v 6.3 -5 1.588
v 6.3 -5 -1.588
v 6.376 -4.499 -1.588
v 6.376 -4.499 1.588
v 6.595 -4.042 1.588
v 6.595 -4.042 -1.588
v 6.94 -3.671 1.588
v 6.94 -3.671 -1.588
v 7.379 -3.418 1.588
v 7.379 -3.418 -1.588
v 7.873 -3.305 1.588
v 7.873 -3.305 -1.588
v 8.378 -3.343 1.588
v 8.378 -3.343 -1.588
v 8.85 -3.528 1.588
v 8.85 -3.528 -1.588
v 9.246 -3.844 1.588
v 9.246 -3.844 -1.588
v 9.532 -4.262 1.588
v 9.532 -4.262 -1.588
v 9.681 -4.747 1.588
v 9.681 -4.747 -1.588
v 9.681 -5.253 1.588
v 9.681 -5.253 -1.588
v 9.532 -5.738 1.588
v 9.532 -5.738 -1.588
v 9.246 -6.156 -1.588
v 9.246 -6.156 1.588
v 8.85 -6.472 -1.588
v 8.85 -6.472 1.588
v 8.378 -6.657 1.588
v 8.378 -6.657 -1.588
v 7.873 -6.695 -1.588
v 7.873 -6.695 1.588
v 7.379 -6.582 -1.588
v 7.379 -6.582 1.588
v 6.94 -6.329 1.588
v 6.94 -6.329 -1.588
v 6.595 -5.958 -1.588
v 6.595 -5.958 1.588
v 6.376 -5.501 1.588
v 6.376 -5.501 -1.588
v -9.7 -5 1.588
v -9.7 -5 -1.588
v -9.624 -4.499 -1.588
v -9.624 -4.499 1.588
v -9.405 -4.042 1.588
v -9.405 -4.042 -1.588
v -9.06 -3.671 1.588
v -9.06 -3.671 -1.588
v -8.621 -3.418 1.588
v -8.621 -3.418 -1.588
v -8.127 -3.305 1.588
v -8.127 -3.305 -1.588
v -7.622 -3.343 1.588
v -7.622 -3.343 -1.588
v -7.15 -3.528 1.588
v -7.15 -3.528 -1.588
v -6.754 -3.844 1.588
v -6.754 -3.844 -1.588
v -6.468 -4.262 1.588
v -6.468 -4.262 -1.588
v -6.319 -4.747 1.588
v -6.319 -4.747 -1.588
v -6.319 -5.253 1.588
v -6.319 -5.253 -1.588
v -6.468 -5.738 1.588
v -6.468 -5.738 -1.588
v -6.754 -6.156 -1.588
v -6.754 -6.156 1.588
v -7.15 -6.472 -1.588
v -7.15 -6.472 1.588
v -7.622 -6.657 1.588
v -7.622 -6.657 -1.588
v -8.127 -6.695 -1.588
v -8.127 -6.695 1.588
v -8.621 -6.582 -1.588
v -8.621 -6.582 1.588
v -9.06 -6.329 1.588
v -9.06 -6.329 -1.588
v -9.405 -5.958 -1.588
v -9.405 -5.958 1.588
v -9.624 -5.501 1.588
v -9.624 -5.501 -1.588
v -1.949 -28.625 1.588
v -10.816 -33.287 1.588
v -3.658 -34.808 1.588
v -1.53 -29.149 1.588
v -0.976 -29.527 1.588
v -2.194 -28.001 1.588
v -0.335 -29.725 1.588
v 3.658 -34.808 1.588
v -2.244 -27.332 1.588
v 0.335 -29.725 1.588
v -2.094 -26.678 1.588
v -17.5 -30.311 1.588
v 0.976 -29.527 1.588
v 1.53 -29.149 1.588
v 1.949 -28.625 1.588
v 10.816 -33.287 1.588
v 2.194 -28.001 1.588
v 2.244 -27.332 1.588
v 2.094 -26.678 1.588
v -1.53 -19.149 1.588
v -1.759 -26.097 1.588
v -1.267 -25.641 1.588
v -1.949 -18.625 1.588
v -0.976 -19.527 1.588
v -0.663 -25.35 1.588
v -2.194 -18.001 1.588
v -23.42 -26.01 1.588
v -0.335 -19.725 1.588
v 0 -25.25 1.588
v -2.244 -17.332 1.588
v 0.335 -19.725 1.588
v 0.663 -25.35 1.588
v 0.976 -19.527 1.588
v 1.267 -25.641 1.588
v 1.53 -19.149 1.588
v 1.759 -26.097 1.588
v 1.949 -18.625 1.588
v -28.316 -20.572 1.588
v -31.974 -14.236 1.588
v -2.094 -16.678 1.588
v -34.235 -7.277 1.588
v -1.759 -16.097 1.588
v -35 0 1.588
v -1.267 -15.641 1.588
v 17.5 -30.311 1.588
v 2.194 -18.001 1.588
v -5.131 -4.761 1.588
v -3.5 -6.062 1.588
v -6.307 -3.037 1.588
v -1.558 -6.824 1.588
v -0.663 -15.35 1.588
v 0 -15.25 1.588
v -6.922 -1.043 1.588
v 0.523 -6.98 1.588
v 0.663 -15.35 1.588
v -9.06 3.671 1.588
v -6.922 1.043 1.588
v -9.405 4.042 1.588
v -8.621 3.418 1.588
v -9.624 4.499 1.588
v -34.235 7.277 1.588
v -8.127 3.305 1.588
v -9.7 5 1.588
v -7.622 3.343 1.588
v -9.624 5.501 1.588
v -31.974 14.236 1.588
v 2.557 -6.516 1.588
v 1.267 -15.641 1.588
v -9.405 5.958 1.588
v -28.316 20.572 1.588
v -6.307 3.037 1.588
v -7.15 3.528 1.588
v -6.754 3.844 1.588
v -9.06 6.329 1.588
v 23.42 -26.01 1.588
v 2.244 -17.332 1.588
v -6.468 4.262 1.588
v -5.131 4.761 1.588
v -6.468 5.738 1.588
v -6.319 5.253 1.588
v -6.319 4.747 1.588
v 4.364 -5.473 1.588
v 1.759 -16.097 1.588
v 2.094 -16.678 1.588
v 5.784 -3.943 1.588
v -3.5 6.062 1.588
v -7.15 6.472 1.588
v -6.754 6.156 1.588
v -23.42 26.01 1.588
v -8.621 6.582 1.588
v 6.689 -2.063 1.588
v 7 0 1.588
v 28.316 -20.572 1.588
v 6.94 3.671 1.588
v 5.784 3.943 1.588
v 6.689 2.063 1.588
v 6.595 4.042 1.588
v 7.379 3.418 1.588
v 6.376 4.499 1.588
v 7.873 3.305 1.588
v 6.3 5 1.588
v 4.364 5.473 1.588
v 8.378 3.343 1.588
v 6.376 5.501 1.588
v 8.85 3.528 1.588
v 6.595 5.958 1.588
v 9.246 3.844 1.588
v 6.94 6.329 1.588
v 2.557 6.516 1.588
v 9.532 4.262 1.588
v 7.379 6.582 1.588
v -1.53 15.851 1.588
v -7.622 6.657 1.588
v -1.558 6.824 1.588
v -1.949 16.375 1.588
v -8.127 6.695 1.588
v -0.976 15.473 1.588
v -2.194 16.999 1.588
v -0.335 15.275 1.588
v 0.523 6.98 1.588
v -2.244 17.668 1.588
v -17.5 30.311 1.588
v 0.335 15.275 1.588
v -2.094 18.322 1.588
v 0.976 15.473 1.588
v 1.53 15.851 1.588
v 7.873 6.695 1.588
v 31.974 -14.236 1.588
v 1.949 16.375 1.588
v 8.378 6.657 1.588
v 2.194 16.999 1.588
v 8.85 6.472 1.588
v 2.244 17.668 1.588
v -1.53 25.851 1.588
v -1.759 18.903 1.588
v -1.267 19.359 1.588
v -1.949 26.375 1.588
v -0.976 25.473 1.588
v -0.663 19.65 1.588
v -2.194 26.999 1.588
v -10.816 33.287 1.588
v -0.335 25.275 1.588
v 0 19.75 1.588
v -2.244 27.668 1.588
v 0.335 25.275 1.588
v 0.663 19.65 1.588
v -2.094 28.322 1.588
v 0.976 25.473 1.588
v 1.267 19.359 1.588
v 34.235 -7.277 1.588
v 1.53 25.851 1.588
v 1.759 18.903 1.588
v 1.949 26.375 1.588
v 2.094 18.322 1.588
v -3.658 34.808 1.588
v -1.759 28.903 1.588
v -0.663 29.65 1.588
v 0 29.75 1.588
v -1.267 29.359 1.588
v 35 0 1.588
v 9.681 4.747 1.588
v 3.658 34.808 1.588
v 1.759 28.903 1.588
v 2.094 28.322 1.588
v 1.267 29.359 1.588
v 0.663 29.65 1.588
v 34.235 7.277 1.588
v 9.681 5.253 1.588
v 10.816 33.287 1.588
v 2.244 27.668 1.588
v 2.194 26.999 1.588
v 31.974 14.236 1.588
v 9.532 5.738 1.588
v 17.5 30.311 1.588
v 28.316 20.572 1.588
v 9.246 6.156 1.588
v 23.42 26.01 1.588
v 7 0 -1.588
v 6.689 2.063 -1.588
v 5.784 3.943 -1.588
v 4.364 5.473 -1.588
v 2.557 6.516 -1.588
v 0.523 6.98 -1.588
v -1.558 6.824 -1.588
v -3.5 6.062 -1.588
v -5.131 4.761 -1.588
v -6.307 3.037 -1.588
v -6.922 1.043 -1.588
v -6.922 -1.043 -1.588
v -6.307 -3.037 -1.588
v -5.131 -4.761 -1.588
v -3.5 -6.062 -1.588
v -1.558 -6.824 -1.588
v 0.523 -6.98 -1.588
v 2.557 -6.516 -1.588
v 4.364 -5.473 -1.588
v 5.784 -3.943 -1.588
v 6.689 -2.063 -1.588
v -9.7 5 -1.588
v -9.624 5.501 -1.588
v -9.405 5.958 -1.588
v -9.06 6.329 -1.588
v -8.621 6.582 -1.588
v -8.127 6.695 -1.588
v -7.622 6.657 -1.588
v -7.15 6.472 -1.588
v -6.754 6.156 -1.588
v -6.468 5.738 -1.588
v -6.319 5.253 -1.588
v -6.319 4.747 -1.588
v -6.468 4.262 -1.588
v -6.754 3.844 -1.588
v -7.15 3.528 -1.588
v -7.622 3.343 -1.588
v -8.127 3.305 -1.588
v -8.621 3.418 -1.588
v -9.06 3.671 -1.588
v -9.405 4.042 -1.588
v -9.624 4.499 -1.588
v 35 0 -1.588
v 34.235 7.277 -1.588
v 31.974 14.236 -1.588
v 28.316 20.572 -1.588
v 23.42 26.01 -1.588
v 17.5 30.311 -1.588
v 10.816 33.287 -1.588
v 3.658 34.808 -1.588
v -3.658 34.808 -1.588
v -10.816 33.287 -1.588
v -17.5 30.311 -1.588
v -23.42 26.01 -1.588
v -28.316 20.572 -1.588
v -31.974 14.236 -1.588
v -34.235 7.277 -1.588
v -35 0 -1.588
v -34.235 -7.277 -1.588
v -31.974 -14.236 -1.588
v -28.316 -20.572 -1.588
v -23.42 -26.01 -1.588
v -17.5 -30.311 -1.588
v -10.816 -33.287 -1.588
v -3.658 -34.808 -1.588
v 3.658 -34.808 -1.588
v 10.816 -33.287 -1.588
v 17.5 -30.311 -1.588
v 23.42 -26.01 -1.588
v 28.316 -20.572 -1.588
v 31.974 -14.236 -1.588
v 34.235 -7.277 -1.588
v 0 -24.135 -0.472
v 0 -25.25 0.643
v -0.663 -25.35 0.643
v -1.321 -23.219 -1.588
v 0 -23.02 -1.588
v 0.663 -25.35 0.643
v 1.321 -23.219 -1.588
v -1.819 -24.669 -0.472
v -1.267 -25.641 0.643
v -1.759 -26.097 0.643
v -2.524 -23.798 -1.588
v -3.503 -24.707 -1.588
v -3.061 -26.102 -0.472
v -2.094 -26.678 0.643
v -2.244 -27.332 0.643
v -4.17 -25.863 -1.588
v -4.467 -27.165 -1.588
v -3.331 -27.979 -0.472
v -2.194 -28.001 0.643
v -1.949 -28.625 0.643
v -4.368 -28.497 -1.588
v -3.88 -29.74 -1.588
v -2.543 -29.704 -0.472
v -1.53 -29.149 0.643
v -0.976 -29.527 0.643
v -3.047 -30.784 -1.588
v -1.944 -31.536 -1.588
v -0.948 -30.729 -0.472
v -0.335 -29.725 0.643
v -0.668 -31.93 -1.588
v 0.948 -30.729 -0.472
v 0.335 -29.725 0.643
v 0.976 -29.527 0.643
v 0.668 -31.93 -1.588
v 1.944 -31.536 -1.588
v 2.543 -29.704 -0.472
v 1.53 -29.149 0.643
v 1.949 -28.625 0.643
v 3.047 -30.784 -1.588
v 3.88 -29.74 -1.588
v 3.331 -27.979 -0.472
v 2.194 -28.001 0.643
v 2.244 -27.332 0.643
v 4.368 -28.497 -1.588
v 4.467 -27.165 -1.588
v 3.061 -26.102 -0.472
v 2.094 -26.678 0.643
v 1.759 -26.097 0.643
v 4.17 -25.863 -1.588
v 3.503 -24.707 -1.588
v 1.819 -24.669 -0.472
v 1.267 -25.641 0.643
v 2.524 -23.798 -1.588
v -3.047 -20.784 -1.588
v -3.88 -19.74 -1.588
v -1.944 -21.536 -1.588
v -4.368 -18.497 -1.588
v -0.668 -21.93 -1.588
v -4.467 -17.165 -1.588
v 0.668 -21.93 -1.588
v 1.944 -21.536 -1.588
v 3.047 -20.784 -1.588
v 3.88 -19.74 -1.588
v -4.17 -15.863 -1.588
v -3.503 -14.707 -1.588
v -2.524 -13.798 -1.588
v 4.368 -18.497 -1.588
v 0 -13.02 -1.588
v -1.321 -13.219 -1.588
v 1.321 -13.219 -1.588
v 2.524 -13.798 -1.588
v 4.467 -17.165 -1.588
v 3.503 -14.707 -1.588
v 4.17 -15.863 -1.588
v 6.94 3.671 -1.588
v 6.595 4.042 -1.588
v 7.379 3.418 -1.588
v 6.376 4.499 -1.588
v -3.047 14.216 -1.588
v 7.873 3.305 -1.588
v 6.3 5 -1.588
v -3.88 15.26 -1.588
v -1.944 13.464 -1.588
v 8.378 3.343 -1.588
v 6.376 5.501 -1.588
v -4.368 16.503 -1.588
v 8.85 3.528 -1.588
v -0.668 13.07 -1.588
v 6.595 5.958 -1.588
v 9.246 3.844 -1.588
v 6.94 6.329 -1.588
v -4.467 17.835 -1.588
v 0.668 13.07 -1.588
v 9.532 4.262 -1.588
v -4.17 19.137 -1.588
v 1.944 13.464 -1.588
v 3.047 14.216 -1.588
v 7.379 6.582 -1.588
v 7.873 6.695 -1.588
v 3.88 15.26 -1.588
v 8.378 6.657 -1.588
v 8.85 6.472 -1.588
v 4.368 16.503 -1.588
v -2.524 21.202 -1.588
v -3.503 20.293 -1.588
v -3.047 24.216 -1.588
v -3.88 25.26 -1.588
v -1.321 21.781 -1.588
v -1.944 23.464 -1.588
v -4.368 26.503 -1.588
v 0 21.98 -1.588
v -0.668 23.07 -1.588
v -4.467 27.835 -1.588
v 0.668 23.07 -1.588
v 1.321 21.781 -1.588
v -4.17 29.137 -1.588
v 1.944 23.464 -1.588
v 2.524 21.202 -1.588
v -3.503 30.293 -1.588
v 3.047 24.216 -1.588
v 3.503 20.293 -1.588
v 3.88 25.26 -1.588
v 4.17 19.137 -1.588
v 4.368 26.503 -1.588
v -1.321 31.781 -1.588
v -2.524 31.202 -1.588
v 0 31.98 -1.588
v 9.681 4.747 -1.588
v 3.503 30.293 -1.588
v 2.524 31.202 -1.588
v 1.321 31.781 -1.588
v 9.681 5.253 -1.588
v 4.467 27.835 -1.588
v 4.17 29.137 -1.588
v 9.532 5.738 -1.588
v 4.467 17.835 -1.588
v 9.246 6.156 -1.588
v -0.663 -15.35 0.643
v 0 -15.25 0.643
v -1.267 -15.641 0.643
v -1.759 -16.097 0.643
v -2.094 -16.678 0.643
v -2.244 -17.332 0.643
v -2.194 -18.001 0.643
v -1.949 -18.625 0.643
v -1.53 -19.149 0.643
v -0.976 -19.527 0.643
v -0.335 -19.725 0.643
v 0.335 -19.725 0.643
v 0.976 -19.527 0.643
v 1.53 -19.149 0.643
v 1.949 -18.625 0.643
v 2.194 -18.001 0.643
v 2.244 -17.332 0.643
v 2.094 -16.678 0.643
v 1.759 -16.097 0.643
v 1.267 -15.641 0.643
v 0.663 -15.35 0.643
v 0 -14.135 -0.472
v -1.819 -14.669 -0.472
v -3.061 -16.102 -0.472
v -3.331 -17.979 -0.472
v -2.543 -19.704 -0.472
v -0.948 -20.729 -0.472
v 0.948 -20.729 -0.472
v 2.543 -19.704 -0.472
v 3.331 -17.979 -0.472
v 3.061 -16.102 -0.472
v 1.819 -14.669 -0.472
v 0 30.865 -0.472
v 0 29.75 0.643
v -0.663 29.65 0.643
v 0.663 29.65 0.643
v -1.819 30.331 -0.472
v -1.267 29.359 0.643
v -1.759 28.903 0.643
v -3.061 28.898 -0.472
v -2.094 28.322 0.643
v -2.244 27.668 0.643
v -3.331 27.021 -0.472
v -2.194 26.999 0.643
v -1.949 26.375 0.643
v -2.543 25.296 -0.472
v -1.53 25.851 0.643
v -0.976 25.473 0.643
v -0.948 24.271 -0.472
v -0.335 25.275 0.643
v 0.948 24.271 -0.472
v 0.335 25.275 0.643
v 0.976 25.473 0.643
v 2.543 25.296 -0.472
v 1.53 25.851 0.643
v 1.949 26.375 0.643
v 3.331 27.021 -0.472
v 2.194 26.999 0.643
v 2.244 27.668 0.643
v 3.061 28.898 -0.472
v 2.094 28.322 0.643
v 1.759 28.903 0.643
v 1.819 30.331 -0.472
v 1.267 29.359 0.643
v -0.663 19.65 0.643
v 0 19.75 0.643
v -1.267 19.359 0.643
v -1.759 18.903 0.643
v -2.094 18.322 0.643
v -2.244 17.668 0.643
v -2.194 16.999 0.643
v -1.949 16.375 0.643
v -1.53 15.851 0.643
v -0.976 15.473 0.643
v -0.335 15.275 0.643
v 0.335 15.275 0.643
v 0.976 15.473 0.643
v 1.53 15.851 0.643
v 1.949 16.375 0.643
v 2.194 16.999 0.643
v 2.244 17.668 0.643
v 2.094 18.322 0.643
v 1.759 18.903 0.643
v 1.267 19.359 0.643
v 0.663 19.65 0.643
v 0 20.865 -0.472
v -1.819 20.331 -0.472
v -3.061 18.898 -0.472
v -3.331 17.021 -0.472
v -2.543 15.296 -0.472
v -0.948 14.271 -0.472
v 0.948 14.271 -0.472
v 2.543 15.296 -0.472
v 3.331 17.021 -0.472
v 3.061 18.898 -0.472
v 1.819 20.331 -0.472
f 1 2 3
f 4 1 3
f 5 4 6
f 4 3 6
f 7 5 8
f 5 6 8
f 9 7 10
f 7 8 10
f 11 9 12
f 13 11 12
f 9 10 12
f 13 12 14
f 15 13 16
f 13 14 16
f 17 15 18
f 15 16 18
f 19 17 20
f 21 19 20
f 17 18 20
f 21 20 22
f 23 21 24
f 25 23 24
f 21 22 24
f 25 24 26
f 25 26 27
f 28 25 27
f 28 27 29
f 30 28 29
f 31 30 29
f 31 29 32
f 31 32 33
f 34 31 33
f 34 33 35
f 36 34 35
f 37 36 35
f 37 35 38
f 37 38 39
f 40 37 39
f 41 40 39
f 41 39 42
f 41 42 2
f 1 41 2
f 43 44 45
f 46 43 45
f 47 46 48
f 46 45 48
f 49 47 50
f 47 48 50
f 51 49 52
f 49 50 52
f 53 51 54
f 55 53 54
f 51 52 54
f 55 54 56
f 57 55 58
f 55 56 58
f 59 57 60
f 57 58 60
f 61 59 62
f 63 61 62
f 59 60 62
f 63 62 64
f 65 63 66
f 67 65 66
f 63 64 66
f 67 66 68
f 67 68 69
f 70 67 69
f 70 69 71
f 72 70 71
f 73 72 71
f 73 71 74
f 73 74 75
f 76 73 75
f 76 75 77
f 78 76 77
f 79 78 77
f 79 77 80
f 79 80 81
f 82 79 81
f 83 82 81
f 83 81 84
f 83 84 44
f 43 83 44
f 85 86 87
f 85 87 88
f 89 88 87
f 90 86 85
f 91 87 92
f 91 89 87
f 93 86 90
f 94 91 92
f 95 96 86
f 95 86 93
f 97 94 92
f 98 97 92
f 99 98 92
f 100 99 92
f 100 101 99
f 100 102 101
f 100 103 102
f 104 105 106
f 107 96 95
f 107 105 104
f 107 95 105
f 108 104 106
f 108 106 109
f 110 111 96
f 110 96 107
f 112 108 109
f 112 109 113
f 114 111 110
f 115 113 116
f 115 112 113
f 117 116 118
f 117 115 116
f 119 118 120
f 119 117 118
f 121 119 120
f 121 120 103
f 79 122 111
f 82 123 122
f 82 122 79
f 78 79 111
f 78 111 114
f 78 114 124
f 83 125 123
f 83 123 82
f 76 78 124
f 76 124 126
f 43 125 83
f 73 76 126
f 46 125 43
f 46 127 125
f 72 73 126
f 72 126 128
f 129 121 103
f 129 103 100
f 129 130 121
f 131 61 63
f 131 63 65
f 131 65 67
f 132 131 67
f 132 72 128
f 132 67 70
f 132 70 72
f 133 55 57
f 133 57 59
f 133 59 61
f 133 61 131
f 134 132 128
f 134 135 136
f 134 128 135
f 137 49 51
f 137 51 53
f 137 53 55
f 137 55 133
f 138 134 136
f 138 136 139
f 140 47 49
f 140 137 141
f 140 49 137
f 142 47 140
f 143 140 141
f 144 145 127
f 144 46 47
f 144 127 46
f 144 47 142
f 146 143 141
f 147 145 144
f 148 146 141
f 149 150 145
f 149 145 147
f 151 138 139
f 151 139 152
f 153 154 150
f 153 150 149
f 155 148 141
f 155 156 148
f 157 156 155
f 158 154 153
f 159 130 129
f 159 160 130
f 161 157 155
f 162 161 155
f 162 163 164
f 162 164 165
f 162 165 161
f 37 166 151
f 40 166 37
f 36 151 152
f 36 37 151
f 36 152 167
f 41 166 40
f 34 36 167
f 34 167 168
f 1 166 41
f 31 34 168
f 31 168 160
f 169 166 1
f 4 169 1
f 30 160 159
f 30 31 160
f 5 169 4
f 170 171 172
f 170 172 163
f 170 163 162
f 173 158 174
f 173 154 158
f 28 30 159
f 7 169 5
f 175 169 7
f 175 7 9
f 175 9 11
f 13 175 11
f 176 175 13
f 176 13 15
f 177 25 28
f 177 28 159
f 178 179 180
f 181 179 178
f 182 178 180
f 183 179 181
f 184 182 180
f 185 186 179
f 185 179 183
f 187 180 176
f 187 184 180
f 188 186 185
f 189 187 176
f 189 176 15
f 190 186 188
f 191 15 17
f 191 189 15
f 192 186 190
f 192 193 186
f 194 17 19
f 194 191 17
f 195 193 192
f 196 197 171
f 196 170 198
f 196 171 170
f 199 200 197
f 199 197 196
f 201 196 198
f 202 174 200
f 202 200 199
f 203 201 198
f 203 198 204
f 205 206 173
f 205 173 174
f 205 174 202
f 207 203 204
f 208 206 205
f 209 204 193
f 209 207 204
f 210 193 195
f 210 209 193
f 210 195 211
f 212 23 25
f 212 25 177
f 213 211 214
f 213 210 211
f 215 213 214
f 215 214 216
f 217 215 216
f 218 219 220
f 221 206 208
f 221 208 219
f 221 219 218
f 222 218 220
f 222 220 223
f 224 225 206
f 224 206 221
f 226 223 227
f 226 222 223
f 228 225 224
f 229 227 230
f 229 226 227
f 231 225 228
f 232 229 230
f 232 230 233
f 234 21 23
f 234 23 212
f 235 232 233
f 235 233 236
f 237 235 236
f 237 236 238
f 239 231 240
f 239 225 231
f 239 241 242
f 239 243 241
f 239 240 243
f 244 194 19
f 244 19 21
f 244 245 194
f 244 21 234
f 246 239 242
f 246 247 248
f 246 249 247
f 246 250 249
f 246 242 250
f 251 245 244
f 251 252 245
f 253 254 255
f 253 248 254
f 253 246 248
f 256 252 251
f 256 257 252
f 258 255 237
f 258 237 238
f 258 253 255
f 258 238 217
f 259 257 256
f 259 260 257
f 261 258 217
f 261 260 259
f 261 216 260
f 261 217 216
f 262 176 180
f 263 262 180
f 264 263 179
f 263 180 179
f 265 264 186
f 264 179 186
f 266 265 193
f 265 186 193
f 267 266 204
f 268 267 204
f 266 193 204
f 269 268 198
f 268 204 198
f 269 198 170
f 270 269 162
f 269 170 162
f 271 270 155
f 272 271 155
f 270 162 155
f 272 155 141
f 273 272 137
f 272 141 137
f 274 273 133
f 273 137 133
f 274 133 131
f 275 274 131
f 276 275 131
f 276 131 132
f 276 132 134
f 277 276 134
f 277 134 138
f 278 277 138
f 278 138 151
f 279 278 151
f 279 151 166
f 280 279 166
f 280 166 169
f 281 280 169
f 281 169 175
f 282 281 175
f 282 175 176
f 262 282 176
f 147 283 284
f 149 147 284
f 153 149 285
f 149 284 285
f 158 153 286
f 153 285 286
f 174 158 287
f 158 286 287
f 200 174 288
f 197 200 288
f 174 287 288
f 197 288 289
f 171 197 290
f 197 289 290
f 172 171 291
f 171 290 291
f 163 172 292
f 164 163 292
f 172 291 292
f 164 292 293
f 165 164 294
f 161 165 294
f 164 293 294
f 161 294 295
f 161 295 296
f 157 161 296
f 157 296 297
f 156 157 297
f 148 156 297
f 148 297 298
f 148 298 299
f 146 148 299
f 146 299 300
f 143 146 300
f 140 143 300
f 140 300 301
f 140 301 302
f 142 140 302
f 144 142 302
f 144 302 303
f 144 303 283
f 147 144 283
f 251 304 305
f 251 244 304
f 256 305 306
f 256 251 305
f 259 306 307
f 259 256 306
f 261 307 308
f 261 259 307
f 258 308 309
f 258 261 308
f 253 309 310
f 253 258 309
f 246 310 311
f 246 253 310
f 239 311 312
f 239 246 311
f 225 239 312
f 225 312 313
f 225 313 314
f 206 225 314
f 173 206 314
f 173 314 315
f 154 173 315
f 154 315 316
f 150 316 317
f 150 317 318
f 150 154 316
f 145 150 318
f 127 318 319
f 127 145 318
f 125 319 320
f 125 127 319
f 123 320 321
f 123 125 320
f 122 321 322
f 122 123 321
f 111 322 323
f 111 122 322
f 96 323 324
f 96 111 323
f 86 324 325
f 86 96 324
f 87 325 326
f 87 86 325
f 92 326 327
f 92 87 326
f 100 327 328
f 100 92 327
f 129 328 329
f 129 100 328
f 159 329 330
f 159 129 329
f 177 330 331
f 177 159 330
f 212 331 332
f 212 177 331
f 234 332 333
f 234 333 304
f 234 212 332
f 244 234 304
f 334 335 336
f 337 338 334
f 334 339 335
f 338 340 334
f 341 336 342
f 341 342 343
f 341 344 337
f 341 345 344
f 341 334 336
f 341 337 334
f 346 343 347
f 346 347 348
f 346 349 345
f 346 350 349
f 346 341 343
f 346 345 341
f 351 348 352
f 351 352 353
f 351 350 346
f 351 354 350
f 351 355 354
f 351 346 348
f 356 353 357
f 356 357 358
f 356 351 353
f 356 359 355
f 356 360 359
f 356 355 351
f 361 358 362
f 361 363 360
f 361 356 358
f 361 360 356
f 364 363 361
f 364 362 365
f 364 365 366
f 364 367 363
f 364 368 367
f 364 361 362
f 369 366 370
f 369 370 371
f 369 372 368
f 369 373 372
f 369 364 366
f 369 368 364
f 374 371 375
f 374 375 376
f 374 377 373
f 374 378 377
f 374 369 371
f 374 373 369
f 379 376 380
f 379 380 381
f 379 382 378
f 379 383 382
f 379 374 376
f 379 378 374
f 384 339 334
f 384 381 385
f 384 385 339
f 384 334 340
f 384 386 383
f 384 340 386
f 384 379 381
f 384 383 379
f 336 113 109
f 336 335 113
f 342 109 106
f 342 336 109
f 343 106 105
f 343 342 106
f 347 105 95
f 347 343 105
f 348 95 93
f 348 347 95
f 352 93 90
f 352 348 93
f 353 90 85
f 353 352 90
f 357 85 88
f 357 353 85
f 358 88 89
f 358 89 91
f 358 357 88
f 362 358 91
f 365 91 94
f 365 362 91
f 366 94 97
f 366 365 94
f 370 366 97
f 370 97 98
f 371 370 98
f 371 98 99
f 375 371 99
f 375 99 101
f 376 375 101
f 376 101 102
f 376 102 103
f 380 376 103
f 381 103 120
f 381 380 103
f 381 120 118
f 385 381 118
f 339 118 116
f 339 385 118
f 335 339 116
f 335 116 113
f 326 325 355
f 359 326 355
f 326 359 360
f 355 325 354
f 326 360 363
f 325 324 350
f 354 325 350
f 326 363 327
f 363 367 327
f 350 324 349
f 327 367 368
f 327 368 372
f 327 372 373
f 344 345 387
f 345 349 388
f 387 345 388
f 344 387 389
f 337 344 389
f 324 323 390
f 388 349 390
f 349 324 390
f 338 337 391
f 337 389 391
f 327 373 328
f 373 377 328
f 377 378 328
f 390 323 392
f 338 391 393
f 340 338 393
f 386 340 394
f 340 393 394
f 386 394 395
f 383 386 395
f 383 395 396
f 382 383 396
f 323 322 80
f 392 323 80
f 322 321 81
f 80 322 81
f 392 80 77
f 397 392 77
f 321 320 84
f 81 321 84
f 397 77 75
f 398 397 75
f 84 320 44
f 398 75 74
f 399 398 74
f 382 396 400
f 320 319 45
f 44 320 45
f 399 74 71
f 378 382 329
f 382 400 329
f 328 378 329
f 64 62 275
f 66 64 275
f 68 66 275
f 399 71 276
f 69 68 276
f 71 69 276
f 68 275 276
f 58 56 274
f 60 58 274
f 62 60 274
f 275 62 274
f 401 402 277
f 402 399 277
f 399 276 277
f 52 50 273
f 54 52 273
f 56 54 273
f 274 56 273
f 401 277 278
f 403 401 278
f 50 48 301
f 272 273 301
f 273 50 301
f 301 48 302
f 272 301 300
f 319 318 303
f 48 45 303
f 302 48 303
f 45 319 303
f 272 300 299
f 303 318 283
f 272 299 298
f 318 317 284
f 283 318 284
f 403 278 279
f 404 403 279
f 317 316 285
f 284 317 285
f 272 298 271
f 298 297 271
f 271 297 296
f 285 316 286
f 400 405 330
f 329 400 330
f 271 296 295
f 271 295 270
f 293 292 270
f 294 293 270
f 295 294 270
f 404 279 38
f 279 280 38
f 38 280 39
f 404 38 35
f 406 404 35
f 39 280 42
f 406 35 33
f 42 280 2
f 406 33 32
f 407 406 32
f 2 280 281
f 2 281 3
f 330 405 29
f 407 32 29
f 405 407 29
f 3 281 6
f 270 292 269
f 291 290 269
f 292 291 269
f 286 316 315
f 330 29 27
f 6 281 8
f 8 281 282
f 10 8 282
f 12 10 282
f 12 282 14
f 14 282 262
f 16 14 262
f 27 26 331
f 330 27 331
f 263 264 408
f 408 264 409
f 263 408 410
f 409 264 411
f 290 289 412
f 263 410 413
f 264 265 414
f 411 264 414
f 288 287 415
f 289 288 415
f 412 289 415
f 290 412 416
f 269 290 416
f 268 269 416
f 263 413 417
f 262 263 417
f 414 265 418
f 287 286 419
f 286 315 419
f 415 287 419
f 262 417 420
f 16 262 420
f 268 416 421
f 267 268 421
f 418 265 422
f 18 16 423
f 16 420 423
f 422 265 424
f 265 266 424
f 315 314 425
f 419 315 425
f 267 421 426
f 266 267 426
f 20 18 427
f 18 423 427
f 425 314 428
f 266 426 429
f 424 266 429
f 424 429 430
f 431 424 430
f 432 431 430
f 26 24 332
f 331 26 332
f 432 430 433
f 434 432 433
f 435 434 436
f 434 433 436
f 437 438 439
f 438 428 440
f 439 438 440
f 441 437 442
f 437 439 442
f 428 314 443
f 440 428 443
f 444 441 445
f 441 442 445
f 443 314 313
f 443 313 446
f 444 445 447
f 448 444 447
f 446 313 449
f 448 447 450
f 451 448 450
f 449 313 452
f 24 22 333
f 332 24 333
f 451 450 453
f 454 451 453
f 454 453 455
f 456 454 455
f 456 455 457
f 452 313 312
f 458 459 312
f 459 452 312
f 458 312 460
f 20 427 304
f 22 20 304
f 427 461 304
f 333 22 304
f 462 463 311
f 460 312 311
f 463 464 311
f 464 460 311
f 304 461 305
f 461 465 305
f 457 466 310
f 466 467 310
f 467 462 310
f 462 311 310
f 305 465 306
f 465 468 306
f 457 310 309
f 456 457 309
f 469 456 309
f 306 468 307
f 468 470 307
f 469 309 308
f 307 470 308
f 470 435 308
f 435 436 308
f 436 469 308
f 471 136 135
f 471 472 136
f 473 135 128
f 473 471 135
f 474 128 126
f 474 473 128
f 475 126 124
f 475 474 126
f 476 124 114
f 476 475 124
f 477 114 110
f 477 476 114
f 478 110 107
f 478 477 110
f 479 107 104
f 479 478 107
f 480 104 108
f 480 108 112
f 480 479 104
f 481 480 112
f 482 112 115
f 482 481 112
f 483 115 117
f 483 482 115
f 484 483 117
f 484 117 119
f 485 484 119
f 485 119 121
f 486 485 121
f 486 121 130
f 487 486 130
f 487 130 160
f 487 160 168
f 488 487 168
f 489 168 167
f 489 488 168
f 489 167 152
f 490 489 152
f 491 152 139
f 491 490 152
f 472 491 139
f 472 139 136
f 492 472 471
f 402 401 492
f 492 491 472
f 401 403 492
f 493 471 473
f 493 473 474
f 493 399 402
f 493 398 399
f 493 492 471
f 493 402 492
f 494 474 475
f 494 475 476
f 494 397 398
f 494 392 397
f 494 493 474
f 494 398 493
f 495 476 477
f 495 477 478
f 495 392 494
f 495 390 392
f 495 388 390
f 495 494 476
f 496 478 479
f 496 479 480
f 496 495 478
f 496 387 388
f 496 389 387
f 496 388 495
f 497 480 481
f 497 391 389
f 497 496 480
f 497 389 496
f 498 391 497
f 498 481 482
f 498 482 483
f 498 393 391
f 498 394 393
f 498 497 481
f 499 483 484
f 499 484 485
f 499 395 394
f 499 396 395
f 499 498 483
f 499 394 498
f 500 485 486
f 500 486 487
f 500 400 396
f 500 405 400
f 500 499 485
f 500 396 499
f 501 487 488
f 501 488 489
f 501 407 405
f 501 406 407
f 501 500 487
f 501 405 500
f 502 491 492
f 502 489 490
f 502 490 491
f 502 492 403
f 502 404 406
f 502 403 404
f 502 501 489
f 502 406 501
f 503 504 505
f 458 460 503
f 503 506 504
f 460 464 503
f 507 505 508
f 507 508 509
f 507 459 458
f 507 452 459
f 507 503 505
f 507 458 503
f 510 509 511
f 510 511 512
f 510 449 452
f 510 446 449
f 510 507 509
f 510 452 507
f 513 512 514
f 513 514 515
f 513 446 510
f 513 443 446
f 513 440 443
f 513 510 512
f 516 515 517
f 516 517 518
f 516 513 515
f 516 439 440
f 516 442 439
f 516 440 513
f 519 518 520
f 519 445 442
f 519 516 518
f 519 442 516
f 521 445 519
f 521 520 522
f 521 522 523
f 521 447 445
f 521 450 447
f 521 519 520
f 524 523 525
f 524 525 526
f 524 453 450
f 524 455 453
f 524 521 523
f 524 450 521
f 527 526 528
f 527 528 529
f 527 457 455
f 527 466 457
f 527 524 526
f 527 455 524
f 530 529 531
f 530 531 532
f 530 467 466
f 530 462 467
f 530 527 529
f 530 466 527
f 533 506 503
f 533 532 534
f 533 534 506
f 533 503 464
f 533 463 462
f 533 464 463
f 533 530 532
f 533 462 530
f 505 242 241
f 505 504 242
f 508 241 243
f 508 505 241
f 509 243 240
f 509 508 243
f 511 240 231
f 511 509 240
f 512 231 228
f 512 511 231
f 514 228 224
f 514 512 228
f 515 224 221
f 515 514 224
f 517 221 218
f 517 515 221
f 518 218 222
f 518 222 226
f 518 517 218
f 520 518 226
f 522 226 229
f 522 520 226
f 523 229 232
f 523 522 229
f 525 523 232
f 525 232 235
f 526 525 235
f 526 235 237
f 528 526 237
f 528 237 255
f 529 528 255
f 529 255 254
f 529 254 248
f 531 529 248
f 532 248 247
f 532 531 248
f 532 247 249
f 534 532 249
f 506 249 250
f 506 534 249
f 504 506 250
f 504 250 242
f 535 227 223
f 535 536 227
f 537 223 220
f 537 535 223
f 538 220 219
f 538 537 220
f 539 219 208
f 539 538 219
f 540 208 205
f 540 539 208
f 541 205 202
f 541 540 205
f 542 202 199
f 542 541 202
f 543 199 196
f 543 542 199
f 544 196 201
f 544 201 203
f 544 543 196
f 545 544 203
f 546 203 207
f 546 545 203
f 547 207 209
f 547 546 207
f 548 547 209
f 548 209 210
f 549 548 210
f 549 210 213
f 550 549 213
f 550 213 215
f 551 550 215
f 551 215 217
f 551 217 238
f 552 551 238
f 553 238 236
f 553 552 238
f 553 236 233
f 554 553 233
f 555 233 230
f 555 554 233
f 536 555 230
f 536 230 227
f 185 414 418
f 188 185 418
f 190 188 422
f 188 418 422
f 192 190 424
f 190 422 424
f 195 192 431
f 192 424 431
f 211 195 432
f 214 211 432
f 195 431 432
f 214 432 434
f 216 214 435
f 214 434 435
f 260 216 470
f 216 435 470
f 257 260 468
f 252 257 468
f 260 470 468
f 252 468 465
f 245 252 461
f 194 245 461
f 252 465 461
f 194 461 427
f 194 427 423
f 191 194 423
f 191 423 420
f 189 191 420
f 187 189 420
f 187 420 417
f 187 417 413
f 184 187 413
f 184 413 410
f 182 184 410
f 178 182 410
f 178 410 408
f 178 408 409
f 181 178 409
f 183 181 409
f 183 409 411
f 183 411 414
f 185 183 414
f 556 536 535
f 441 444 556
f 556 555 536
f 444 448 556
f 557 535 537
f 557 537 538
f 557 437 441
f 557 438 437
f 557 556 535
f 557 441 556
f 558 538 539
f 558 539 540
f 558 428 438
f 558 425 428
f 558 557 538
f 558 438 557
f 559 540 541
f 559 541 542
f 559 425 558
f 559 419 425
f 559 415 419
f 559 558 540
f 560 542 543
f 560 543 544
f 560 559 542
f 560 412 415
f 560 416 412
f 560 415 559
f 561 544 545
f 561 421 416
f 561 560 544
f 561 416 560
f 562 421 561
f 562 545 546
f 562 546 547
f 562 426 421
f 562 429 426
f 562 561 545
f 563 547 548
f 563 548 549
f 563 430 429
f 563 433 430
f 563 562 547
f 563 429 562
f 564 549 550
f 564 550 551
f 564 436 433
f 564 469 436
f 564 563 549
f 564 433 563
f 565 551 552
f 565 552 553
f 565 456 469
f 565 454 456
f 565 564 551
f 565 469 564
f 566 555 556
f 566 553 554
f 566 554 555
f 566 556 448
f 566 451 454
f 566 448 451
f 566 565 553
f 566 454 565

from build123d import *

# Parameters (mm, degrees)
SKETCH2_R                    = 35
BOSS_EXTRUDE1_DEPTH          = 1.5875
SKETCH3_R                    = 7
CUT_EXTRUDE1_DEPTH           = 4.175
M3_CLEARANCE_HOLE1_D         = 3.4
CSK_FOR_M4_SFHCS1_AT_2_COUNT = 2
CSK_FOR_M4_SFHCS1_AT_2_PITCH = 10
CSK_FOR_M4_SFHCS1_AT_3_COUNT = 2
CSK_FOR_M4_SFHCS1_AT_3_PITCH = 45
CSK_FOR_M4_SFHCS1_AT_4_COUNT = 2
CSK_FOR_M4_SFHCS1_AT_4_PITCH = 55


with BuildPart() as part:
    # Sketch2 → Boss-Extrude1 (new body, symmetric)
    with BuildSketch(Plane.XY):
        Circle(SKETCH2_R)
    extrude(amount=BOSS_EXTRUDE1_DEPTH, both=True)

    # Sketch3 → Cut-Extrude1 (cut, through all)
    with BuildSketch(Plane.XY.offset(1.5875)):
        Circle(SKETCH3_R)
    extrude(amount=-CUT_EXTRUDE1_DEPTH, mode=Mode.SUBTRACT)

    # M3 Clearance Hole1 (through all)
    with Locations(Plane.XY.offset(1.5875)):
        with Locations((8, 5), (8, -5), (-8, 5), (-8, -5)):
            Hole(M3_CLEARANCE_HOLE1_D / 2)

    # Sketch8 → CSK for M4 SFHCS1 (revolve, cut)
    with BuildSketch(Plane(origin=(2.358e-06, 27.5, -1.5875), x_dir=(0, 1, 0), z_dir=(1, 0, 0))):
        Polygon((0, 0), (0, 3.175), (2.25, 3.175), (2.25, 2.23), (4.48, 0), align=None)
    csk_for_m4_sfhcs1 = revolve(axis=Axis((2.358e-06, 27.5, -7.9375), (0, 0, 1)), mode=Mode.SUBTRACT)

    # CSK for M4 SFHCS1 at 2: CSK for M4 SFHCS1 ×2
    with Locations(*[(0, -i * CSK_FOR_M4_SFHCS1_AT_2_PITCH, 0) for i in range(1, CSK_FOR_M4_SFHCS1_AT_2_COUNT)]):
        add(csk_for_m4_sfhcs1, mode=Mode.SUBTRACT)

    # CSK for M4 SFHCS1 at 3: CSK for M4 SFHCS1 ×2
    with Locations(*[(0, -i * CSK_FOR_M4_SFHCS1_AT_3_PITCH, 0) for i in range(1, CSK_FOR_M4_SFHCS1_AT_3_COUNT)]):
        add(csk_for_m4_sfhcs1, mode=Mode.SUBTRACT)

    # CSK for M4 SFHCS1 at 4: CSK for M4 SFHCS1 ×2
    with Locations(*[(0, -i * CSK_FOR_M4_SFHCS1_AT_4_PITCH, 0) for i in range(1, CSK_FOR_M4_SFHCS1_AT_4_COUNT)]):
        add(csk_for_m4_sfhcs1, mode=Mode.SUBTRACT)


solid = part.part
